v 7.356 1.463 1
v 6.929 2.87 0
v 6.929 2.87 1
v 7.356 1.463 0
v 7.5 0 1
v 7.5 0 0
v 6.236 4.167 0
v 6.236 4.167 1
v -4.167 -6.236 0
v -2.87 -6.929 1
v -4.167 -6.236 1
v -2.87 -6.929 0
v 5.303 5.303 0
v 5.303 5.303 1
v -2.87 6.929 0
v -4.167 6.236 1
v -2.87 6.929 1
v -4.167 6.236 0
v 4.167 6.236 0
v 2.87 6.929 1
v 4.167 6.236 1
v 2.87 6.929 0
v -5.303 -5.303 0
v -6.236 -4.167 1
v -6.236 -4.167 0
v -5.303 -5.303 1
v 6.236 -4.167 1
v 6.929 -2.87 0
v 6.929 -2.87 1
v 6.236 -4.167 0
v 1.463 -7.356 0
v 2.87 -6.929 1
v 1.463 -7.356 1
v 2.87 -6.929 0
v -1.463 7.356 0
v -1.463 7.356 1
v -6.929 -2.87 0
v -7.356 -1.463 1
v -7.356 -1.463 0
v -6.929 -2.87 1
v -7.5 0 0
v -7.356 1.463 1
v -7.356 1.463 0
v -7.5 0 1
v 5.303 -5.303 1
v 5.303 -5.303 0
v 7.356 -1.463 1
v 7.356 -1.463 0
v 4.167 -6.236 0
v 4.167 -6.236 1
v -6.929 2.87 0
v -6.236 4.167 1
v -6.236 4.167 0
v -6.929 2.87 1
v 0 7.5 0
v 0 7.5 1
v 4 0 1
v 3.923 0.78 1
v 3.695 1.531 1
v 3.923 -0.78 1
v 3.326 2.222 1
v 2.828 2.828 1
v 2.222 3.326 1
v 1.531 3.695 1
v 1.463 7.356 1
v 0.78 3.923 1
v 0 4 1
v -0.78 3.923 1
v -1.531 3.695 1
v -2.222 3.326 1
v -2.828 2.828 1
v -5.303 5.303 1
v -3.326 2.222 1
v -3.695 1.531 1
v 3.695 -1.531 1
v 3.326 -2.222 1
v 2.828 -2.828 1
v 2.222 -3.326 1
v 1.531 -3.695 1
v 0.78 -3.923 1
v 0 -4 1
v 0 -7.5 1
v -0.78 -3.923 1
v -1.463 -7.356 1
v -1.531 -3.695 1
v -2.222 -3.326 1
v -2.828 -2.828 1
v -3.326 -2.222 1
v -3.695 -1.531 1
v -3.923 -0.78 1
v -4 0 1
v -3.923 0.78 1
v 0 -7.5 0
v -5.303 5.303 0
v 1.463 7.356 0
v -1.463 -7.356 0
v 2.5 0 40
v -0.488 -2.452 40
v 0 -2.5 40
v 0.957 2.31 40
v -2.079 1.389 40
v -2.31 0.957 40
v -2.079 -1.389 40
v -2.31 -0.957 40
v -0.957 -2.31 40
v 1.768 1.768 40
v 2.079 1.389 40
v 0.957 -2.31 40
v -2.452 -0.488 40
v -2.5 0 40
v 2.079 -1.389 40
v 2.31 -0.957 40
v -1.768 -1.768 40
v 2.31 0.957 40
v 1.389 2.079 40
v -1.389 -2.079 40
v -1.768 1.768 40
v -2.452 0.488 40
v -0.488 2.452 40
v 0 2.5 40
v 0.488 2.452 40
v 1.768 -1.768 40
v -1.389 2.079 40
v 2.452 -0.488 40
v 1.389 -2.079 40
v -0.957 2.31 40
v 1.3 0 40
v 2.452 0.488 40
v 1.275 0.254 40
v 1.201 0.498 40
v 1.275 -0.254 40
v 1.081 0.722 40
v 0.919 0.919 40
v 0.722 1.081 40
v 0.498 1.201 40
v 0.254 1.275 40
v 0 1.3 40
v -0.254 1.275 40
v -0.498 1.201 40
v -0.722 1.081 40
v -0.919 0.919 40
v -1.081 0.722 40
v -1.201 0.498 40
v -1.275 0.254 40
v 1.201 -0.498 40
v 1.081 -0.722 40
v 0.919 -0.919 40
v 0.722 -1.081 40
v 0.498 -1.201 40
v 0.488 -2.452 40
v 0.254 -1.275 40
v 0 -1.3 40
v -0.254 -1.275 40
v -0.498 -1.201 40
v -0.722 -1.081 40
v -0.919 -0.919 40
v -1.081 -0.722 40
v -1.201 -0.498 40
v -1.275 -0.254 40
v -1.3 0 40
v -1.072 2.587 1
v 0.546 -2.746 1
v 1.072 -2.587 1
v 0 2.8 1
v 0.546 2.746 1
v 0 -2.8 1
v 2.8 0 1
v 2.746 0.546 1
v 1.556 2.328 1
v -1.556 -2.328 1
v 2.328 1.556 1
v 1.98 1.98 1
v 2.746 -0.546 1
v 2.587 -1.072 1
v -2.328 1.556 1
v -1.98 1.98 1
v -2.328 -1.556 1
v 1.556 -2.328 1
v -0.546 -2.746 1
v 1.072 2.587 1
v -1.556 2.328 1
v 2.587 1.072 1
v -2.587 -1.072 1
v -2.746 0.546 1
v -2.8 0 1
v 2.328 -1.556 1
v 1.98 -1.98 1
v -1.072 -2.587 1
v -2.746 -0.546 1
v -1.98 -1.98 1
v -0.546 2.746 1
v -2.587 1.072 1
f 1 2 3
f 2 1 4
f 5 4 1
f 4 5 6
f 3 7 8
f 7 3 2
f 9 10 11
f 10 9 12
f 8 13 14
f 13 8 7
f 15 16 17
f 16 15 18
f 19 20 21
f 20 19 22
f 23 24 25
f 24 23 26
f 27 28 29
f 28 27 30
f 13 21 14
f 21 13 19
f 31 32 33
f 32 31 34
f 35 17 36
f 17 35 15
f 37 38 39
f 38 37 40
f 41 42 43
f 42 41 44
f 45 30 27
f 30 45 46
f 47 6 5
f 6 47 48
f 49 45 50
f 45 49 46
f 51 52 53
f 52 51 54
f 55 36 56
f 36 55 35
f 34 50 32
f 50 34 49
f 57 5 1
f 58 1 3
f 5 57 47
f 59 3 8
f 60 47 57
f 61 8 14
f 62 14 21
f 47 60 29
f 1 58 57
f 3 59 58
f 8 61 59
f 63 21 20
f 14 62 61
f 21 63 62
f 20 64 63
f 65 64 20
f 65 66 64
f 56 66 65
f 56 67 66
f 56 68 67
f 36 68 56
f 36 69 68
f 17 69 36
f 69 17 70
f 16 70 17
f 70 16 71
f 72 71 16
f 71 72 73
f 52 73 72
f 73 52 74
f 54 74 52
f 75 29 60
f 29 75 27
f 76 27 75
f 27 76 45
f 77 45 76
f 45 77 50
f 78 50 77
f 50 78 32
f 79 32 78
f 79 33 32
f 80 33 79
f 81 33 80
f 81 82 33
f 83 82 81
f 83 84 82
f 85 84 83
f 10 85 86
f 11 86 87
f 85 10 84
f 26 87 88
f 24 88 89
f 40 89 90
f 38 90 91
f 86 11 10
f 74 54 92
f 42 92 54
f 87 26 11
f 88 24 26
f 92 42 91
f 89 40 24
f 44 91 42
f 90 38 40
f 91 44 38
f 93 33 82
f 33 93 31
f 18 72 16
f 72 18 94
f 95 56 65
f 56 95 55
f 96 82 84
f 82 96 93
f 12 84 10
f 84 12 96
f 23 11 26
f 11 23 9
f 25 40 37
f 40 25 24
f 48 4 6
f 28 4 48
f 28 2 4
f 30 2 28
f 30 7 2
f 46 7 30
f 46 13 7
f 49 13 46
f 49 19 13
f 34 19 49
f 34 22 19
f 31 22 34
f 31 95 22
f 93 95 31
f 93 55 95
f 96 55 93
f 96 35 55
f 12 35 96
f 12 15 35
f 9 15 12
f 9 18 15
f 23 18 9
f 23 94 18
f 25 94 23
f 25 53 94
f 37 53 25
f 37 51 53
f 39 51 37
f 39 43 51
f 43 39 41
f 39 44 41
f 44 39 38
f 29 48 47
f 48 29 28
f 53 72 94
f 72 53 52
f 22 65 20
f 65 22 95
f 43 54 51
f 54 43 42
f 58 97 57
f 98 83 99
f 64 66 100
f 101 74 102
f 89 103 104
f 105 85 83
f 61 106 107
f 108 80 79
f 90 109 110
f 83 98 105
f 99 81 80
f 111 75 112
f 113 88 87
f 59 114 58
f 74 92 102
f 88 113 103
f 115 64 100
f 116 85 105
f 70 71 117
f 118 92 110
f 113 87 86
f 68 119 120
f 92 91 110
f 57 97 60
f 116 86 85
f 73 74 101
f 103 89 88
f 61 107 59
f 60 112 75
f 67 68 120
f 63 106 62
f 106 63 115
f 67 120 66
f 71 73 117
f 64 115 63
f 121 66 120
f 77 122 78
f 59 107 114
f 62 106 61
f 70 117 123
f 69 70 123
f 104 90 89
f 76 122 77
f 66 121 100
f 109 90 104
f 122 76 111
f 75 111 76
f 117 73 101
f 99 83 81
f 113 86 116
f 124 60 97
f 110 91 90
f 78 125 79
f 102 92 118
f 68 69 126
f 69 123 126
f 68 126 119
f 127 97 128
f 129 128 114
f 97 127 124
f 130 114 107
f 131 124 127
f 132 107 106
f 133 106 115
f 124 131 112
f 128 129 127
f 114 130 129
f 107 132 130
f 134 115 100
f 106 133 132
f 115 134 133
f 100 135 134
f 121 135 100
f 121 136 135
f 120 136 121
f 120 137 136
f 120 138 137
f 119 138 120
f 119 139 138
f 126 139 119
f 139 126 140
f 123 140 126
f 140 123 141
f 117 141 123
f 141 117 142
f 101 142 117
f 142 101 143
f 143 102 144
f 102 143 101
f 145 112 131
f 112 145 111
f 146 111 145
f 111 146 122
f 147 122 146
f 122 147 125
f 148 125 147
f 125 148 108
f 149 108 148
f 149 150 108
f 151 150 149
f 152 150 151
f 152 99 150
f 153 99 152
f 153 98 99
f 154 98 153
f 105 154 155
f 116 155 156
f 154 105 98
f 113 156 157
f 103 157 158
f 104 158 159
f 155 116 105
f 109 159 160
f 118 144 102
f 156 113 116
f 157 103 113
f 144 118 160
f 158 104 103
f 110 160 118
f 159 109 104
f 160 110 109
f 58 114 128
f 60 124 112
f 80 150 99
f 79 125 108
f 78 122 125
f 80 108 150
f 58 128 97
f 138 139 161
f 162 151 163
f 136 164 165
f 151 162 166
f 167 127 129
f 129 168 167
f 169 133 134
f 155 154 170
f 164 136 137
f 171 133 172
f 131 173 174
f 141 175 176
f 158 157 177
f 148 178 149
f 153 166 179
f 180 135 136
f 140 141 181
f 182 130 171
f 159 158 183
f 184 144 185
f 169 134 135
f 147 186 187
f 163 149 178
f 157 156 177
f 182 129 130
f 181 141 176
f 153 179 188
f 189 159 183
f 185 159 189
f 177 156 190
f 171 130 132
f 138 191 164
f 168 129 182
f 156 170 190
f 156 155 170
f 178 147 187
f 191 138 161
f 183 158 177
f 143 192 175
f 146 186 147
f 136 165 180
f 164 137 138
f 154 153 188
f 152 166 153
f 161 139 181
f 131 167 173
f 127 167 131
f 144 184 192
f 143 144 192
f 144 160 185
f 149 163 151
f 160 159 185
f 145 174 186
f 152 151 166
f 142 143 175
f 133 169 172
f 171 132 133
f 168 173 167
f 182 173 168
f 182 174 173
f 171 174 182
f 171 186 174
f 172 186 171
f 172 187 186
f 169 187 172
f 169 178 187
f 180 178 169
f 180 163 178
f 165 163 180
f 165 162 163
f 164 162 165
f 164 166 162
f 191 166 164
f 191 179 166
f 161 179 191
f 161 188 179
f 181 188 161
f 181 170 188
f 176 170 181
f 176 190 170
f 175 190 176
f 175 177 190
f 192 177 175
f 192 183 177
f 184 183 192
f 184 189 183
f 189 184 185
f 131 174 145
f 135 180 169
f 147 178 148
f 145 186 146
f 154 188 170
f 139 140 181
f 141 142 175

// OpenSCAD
// A dummy object to increase the cooling time of the real printed object.


/* [Global] */

// Should be at least the height of your 'real' printed object.
total_height = 40;
base_diameter = 15;
base_height = 1;
cone_bottom_diameter = 8;
cone_top_diameter = 5;
cone_wall_thickness = 1.2;
// For debugging. Normally should be 0.
cross_cut = 0;

/* [Hidden] */

// Small, greater than zero values to maintain manifold.
eps=0.001;
eps2 = 2*eps;

$fn=32;

module base() {
  cylinder(d=base_diameter, h=base_height);
}

module cone_body() {
  translate([0, 0, base_height-eps]) cylinder(
      d1=cone_bottom_diameter, 
      d2=cone_top_diameter, 
      h=total_height - base_height + eps);
}

module cone_hole() {
  translate([0, 0, base_height]) cylinder(
      d1=cone_bottom_diameter-2*cone_wall_thickness, 
      d2=cone_top_diameter-2*cone_wall_thickness, 
      h=total_height - base_height + eps);
}

module main() {
  difference() {
    union() {
      base();
      cone_body();
    }
    cone_hole();
    if (cross_cut) {
      translate([0, 0, -eps]) cube([base_diameter, base_diameter, total_height+eps2]);
    }
  }
}

main();
